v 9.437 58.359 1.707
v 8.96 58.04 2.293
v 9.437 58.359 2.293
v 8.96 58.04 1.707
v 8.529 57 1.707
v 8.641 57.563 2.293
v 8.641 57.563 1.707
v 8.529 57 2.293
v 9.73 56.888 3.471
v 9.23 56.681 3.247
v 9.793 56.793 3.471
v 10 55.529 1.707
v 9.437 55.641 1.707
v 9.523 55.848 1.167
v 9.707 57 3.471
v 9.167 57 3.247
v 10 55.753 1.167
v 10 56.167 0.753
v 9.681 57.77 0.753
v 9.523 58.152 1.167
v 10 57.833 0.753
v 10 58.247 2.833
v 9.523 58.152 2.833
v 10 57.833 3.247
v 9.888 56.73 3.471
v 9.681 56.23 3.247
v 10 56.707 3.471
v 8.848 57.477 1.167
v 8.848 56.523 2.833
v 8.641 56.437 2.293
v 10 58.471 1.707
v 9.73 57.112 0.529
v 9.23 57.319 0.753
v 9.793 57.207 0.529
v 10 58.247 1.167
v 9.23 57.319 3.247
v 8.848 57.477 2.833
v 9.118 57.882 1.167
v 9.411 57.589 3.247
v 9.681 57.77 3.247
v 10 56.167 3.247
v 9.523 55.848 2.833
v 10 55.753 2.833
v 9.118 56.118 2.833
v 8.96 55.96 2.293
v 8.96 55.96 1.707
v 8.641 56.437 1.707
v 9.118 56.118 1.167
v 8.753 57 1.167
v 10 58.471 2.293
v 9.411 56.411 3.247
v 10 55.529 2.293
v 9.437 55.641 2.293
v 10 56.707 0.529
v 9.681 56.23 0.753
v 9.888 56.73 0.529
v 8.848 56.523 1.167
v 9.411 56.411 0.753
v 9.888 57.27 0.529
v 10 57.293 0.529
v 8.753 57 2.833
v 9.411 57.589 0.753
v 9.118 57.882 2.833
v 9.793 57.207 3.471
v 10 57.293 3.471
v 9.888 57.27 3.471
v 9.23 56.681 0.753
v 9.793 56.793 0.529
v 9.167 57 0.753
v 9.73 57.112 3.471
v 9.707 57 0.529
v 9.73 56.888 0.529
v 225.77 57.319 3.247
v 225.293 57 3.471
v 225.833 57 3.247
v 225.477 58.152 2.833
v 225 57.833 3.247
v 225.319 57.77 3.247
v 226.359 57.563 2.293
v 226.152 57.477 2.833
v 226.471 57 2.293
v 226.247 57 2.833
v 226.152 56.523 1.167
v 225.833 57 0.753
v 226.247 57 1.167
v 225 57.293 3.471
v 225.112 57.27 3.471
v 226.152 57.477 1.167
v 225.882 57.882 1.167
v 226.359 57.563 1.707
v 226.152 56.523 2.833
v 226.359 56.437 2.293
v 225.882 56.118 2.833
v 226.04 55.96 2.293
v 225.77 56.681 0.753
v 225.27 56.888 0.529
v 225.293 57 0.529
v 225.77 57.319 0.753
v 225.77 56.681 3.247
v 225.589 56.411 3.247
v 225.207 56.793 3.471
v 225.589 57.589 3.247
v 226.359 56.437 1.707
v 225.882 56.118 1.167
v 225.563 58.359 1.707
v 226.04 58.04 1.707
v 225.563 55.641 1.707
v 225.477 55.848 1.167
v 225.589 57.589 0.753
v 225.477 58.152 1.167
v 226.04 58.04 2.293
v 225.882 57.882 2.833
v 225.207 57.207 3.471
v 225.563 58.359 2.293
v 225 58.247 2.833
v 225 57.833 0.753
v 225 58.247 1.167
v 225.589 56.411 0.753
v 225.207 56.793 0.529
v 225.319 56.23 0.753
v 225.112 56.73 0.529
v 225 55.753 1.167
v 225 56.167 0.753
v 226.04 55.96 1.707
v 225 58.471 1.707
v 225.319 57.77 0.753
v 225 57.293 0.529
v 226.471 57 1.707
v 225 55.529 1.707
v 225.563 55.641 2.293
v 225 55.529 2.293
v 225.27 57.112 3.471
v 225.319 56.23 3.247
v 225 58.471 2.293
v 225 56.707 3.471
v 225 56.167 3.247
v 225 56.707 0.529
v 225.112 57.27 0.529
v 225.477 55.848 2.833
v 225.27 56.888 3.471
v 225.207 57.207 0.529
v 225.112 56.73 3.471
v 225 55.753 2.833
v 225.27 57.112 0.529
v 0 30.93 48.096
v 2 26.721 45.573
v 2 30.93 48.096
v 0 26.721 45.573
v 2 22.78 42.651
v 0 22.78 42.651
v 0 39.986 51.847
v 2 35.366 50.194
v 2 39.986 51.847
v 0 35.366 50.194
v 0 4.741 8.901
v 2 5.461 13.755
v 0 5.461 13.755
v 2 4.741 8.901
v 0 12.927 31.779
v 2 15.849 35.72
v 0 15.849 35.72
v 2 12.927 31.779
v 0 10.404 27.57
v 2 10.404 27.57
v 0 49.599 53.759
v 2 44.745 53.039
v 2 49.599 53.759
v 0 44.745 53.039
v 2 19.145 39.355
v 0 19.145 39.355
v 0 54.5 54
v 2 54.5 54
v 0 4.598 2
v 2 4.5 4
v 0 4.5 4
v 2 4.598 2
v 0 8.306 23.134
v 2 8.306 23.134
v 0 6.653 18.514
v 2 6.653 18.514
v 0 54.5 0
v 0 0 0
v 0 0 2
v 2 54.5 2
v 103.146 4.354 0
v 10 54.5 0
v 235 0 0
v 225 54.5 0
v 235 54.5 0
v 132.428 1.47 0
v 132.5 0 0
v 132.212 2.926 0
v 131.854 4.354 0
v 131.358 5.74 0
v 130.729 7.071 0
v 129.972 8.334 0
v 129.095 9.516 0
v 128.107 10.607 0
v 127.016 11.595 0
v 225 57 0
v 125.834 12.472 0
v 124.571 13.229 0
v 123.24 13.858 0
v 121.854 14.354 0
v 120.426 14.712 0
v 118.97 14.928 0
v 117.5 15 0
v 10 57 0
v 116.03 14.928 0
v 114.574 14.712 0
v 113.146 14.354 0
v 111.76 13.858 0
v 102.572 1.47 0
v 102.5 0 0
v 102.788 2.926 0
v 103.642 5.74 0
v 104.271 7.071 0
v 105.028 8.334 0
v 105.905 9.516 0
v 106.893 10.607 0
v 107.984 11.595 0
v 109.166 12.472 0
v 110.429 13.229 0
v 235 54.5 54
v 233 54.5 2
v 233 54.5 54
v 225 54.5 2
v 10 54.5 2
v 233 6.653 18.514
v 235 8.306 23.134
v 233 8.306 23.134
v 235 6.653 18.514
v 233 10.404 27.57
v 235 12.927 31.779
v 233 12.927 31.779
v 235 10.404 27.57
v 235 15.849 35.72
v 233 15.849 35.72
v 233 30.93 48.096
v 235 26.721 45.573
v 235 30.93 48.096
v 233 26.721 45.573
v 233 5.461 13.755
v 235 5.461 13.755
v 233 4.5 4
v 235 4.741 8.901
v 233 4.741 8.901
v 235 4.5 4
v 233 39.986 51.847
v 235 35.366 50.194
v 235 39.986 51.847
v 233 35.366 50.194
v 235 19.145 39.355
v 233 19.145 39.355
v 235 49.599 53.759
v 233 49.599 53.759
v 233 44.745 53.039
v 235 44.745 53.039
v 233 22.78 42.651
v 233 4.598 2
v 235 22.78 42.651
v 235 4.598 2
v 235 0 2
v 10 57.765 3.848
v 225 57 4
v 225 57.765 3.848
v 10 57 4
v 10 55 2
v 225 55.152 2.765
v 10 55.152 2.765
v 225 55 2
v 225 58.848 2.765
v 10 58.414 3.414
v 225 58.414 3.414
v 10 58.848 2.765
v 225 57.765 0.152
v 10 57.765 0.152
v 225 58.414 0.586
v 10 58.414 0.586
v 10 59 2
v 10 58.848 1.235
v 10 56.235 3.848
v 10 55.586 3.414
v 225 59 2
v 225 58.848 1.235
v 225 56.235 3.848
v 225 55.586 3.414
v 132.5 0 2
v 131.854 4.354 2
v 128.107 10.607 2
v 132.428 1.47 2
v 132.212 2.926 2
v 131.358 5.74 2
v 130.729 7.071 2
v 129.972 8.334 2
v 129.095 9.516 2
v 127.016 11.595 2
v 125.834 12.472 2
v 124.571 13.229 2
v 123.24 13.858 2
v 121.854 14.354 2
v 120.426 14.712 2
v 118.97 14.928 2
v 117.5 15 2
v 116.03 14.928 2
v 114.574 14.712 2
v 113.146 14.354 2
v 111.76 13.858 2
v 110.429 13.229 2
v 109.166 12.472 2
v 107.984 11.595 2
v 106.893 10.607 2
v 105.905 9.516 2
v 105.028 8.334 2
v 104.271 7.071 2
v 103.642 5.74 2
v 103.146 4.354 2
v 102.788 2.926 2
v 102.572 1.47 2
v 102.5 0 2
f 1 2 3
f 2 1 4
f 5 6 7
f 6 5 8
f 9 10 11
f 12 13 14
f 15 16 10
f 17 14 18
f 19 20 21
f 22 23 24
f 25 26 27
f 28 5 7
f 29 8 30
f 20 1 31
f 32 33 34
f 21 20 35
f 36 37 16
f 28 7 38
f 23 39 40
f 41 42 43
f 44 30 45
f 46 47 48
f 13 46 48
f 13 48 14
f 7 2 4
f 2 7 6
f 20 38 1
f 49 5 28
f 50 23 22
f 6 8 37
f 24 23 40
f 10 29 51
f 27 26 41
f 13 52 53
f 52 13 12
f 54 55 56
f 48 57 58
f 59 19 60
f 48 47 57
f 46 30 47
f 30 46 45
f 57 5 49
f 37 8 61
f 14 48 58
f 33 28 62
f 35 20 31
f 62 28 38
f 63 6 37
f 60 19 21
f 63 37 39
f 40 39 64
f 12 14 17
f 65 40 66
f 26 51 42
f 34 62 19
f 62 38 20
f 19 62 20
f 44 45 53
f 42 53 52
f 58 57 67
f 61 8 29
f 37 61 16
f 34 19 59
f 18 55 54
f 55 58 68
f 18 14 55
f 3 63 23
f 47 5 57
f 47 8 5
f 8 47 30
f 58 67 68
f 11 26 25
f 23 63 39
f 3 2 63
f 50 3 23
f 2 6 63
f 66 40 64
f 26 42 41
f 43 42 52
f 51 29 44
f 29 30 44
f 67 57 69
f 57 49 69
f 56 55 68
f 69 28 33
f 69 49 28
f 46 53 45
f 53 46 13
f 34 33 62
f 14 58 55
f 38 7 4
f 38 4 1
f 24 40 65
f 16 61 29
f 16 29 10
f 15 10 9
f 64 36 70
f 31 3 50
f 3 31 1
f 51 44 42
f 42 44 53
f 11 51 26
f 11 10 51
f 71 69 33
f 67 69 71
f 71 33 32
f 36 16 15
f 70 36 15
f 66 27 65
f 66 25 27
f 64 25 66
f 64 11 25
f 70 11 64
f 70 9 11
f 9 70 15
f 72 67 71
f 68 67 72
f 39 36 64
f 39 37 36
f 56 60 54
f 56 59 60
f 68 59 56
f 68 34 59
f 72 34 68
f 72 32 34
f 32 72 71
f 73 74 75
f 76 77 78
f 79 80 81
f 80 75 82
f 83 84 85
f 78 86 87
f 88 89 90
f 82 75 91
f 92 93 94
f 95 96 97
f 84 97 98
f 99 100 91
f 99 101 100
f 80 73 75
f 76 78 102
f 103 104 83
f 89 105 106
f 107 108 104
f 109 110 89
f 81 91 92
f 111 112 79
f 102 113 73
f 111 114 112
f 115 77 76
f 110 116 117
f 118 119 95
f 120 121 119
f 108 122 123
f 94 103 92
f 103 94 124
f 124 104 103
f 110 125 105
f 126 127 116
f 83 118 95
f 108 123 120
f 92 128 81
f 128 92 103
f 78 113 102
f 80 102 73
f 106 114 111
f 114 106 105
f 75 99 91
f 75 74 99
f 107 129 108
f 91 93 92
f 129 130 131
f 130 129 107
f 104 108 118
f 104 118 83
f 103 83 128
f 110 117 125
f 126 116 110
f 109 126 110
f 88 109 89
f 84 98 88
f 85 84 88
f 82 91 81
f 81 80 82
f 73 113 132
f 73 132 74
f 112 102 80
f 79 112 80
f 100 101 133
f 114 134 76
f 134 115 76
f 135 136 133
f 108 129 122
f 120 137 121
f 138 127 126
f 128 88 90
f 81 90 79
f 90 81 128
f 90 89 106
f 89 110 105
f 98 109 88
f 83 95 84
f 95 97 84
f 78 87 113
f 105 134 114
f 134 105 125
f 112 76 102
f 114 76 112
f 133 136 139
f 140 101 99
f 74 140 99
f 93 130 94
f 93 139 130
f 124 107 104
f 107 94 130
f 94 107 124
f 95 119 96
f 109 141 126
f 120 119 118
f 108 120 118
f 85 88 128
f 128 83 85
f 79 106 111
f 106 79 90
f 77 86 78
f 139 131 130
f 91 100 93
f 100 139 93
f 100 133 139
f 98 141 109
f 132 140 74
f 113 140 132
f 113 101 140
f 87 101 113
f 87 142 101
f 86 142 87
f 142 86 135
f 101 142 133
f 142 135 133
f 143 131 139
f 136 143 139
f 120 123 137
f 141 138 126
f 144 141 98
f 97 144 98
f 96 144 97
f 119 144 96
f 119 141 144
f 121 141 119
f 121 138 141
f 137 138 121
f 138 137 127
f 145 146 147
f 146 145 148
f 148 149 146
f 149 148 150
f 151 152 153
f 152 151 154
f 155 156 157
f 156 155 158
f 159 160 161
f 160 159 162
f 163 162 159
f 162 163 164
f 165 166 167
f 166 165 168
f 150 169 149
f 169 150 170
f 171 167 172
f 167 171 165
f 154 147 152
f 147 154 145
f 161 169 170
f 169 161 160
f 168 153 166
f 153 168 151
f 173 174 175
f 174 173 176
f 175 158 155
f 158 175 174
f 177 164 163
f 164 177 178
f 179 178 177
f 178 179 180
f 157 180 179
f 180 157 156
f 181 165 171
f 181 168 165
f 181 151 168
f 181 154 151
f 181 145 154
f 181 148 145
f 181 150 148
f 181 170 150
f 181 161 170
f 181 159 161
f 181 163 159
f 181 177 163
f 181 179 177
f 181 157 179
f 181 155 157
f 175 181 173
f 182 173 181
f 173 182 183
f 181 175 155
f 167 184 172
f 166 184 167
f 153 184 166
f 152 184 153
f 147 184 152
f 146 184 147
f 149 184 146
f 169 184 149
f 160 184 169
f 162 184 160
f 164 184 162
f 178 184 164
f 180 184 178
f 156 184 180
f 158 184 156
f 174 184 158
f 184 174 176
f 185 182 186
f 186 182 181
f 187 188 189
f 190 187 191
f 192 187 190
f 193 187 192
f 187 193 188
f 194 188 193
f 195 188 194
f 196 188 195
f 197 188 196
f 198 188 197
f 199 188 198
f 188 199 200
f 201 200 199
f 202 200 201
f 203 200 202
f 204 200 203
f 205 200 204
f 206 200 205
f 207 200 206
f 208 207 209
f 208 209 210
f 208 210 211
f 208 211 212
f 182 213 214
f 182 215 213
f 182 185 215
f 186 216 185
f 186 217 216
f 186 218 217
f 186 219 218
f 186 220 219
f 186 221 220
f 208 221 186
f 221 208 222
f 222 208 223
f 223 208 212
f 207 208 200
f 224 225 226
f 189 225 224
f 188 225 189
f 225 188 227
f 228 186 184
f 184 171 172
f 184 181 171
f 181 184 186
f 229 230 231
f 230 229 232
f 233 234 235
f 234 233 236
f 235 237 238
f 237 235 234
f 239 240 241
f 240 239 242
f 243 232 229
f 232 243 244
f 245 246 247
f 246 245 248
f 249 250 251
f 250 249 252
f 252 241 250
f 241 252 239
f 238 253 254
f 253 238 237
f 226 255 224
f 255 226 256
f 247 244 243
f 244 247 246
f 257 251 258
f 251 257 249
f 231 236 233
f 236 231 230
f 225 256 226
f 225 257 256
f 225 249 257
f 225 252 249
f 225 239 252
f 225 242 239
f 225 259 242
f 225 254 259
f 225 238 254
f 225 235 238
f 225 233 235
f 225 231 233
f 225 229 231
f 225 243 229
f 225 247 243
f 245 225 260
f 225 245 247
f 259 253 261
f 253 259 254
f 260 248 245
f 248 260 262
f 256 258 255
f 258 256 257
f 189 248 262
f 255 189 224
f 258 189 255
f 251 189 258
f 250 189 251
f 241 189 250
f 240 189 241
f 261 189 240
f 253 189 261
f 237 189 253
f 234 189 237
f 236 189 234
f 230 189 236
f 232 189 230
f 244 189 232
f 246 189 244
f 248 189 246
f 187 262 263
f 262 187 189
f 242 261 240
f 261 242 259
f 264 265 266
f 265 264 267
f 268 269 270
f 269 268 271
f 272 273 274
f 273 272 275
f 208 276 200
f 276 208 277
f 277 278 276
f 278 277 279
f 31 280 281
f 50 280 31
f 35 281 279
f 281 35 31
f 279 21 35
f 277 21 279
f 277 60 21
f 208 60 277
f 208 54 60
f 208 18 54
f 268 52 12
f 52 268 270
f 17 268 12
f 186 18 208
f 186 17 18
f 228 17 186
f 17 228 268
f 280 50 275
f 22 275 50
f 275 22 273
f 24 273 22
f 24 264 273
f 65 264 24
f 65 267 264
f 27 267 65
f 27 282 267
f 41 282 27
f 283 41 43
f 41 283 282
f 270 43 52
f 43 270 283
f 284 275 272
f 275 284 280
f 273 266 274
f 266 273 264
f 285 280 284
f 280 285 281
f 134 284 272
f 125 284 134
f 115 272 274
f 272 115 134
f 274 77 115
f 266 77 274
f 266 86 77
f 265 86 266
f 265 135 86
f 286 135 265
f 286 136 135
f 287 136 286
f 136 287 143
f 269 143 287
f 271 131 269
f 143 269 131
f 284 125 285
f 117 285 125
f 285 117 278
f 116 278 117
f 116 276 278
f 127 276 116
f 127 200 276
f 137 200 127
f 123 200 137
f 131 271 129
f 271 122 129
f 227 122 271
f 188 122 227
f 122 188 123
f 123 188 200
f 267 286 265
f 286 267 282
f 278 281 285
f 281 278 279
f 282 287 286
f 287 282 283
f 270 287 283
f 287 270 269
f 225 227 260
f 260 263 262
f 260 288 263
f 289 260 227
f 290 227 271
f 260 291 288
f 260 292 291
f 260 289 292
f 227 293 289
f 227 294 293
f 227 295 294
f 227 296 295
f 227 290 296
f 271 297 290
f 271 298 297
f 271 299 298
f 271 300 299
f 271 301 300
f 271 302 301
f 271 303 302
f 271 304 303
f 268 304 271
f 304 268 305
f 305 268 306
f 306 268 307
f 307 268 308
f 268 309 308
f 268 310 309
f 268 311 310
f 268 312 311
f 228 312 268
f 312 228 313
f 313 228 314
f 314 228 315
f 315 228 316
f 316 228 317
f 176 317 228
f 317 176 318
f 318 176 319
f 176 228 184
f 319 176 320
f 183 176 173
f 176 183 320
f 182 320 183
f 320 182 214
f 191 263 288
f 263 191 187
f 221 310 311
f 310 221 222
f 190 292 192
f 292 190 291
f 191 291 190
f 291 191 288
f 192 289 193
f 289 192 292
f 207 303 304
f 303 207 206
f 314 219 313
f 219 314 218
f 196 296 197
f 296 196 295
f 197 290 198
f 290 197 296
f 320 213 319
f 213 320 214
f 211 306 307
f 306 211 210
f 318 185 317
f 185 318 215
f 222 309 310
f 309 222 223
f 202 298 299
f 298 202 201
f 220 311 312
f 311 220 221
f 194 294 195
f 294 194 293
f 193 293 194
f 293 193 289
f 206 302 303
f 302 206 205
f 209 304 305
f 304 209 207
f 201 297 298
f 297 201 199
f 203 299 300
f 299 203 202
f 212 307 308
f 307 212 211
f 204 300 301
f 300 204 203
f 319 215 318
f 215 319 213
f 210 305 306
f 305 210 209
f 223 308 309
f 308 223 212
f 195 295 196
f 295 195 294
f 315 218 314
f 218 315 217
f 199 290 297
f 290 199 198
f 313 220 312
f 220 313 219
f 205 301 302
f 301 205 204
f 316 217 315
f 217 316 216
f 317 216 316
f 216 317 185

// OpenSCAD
R = 40;
W = 410;
D = 220;
H = 60;
paperX = 140;
thick = 4;

thickCase = 2;
spaceCase = 1;
Wcase = 110 + thickCase * 2;
Xcase = paperX - thick - spaceCase - Wcase;

if (0) { // drawer
    difference() {
        intersection() {
            base();
            translate([Xcase, 0, 0])
                cube([paperX - Xcase, D, H]);
            cube([W, D, H - spaceCase * 2]);
        }
        translate([Xcase + Wcase, thickCase, 0])
            cube([W, D, H]);
        translate([R, R, H - 10])
            cylinder(r = R - thickCase, h = H - thickCase, $fn = 128);
        difference() {
            translate([R, R, thickCase])
                cylinder(r = R - thickCase, h = H, $fn = 128);
            translate([Xcase, 0, 0])
                cube([thickCase, D, H]);
        }
        translate([R, thickCase, H - 10])
            cube([Xcase + Wcase - R, D, H]);
        translate([R, thickCase, thickCase])
            cube([Xcase + (Wcase - thickCase) - R, D - thickCase * 2, H]);
        translate([Xcase, R, H - 10])
            cube([W, D, H]);
        translate([Xcase + thickCase, R, thickCase])
            cube([R, D - R - thickCase, H]);
        translate([(paperX + Xcase) / 2, 0, 0])
            sphere(r = 15, $fn = 64);
    }
    intersection() {
        translate([(paperX + Xcase) / 2, -15, 0]) {
            difference() {
                sphere(r = 30 + thickCase, $fn = 64);
                sphere(r = 30, $fn = 64);
            }
        }
        cube([W, D, H]);
    }
} else if (0) { // case
    difference() {
        base();
        translate([0, R * 1.5, 0])
            cube([W, D, H]);
        translate([paperX, 0, 0])
            cube([W, D, H]);
        translate([Xcase - spaceCase, 0, 0])
            cube([Wcase + spaceCase * 2, D, H - thick]);
        translate([R, 0, 0])
            cube([W, thickCase + 1, H]);
        difference() {
            translate([R, R, H - thick])
                cylinder(r = R, h = thick, $fn = 128);
            translate([R, R, H - thick])
                cylinder(r = R - (thickCase + 1), h = thick, $fn = 128);
            translate([0, 0, 0])
                cube([Xcase - spaceCase, D, H]);
            translate([R, 0, 0])
                cube([R, D, H]);
        }
        translate([paperX - thick, R - 10.5, 0])
            cube([thick, 21, thick + 1]);
        translate([paperX - thick, R - 10.5, 0])
            cube([thick * .5 + 0.5, 21, 10]);
    }
} else if (0) { // right foot
    difference() {
        translate([R, 0, 0]) {
            mirror([1, 0, 0]) {
                intersection() {
                    base();
                    cube([R, R * 1.5, H]);
                }
            }
        }
        translate([0, R - 10.5, 0])
            cube([thickCase, 21, thick + 1]);
        intersection() {
            translate([0, R, 0])
                cylinder(r = R - thickCase, h = H - thick, $fn = 128);
            translate([thickCase, thickCase, 0])
                cube([R - thickCase * 2, R * 1.5 - thickCase * 2, H - thick]);
        }
        translate([thickCase, R, 0])
            cube([R - thickCase * 2, R * 0.5 - thickCase, H - thick]);
        translate([R - 10.5 - thickCase, R * 1.5 - thickCase, 0])
            cube([10.5, thickCase, thickCase + 1]);
    }
} else if (0) { // paper case floor
    Wfloor = 236;
    difference() {
        union() {
            rotate([0, 90, 0])
                linear_extrude(Wfloor)
                    polygon([[0, 0], [-thick, 0], [-thick, 50], [0, 50 + thick * 2]]);
            translate([-thickCase * 2, 30])
                cube([Wfloor + thickCase * 4, 20, thick]);
            for (x = [-thickCase * 2, Wfloor + thickCase])
                translate([x, 30, 0])
                    cube([thickCase, 20, thick * 1.75]);
        }
        translate([10, 0, 0])
            cube([Wfloor - 20, 10, thick]);
        for (x = [10 - thick, Wfloor - 10])
            translate([x, thick / 2 + 0.6, thick / 2])
                rotate([0, 90, 0])
                    cylinder(r = thick / 2 - 0.4, h = thick, $fn = 32);
    }
} else { // paper case door
    Wfloor = 235;
    difference() {
        union() {
            translate([10, H - 3, 2])
                rotate([0, 90, 0])
                    cylinder(r = 2, h = Wfloor - 20, $fn = 16);
            cube([Wfloor, H - 1.5 - thick, 2]);
            translate([10, 0, 0])
                cube([Wfloor - 20, H - 3, 2]);
            for (x = [10, Wfloor - 10])
                translate([x, H - 3, 2])
                    sphere(r = 1.5, $fn = 16);
            for (x = [0, Wfloor - 2]) {
                intersection() {
                    translate([x, H - 1.5 - thick, thick])
                        rotate([0, 90, 0])
                            cylinder(r = H - 10, h = 2, $fn = 64);
                    translate([x, 0, 0])
                        cube([thick, H - 1.5 - thick, H]);
                }
            }
        }
        translate([Wfloor / 2, 0, 0])
            cylinder(r = 15, h = 2, $fn = 64);
    }
}

module base() {
    union() {
        intersection() {
            translate([R, R, 0])
                cylinder(r = R, h = H, $fn = 128);
            cube([R, R, H]);
        }
        translate([R, 0, 0])
            cube([paperX - R, D, H]);
        translate([0, R, 0])
            cube([R, D - R, H]);
    }
}
